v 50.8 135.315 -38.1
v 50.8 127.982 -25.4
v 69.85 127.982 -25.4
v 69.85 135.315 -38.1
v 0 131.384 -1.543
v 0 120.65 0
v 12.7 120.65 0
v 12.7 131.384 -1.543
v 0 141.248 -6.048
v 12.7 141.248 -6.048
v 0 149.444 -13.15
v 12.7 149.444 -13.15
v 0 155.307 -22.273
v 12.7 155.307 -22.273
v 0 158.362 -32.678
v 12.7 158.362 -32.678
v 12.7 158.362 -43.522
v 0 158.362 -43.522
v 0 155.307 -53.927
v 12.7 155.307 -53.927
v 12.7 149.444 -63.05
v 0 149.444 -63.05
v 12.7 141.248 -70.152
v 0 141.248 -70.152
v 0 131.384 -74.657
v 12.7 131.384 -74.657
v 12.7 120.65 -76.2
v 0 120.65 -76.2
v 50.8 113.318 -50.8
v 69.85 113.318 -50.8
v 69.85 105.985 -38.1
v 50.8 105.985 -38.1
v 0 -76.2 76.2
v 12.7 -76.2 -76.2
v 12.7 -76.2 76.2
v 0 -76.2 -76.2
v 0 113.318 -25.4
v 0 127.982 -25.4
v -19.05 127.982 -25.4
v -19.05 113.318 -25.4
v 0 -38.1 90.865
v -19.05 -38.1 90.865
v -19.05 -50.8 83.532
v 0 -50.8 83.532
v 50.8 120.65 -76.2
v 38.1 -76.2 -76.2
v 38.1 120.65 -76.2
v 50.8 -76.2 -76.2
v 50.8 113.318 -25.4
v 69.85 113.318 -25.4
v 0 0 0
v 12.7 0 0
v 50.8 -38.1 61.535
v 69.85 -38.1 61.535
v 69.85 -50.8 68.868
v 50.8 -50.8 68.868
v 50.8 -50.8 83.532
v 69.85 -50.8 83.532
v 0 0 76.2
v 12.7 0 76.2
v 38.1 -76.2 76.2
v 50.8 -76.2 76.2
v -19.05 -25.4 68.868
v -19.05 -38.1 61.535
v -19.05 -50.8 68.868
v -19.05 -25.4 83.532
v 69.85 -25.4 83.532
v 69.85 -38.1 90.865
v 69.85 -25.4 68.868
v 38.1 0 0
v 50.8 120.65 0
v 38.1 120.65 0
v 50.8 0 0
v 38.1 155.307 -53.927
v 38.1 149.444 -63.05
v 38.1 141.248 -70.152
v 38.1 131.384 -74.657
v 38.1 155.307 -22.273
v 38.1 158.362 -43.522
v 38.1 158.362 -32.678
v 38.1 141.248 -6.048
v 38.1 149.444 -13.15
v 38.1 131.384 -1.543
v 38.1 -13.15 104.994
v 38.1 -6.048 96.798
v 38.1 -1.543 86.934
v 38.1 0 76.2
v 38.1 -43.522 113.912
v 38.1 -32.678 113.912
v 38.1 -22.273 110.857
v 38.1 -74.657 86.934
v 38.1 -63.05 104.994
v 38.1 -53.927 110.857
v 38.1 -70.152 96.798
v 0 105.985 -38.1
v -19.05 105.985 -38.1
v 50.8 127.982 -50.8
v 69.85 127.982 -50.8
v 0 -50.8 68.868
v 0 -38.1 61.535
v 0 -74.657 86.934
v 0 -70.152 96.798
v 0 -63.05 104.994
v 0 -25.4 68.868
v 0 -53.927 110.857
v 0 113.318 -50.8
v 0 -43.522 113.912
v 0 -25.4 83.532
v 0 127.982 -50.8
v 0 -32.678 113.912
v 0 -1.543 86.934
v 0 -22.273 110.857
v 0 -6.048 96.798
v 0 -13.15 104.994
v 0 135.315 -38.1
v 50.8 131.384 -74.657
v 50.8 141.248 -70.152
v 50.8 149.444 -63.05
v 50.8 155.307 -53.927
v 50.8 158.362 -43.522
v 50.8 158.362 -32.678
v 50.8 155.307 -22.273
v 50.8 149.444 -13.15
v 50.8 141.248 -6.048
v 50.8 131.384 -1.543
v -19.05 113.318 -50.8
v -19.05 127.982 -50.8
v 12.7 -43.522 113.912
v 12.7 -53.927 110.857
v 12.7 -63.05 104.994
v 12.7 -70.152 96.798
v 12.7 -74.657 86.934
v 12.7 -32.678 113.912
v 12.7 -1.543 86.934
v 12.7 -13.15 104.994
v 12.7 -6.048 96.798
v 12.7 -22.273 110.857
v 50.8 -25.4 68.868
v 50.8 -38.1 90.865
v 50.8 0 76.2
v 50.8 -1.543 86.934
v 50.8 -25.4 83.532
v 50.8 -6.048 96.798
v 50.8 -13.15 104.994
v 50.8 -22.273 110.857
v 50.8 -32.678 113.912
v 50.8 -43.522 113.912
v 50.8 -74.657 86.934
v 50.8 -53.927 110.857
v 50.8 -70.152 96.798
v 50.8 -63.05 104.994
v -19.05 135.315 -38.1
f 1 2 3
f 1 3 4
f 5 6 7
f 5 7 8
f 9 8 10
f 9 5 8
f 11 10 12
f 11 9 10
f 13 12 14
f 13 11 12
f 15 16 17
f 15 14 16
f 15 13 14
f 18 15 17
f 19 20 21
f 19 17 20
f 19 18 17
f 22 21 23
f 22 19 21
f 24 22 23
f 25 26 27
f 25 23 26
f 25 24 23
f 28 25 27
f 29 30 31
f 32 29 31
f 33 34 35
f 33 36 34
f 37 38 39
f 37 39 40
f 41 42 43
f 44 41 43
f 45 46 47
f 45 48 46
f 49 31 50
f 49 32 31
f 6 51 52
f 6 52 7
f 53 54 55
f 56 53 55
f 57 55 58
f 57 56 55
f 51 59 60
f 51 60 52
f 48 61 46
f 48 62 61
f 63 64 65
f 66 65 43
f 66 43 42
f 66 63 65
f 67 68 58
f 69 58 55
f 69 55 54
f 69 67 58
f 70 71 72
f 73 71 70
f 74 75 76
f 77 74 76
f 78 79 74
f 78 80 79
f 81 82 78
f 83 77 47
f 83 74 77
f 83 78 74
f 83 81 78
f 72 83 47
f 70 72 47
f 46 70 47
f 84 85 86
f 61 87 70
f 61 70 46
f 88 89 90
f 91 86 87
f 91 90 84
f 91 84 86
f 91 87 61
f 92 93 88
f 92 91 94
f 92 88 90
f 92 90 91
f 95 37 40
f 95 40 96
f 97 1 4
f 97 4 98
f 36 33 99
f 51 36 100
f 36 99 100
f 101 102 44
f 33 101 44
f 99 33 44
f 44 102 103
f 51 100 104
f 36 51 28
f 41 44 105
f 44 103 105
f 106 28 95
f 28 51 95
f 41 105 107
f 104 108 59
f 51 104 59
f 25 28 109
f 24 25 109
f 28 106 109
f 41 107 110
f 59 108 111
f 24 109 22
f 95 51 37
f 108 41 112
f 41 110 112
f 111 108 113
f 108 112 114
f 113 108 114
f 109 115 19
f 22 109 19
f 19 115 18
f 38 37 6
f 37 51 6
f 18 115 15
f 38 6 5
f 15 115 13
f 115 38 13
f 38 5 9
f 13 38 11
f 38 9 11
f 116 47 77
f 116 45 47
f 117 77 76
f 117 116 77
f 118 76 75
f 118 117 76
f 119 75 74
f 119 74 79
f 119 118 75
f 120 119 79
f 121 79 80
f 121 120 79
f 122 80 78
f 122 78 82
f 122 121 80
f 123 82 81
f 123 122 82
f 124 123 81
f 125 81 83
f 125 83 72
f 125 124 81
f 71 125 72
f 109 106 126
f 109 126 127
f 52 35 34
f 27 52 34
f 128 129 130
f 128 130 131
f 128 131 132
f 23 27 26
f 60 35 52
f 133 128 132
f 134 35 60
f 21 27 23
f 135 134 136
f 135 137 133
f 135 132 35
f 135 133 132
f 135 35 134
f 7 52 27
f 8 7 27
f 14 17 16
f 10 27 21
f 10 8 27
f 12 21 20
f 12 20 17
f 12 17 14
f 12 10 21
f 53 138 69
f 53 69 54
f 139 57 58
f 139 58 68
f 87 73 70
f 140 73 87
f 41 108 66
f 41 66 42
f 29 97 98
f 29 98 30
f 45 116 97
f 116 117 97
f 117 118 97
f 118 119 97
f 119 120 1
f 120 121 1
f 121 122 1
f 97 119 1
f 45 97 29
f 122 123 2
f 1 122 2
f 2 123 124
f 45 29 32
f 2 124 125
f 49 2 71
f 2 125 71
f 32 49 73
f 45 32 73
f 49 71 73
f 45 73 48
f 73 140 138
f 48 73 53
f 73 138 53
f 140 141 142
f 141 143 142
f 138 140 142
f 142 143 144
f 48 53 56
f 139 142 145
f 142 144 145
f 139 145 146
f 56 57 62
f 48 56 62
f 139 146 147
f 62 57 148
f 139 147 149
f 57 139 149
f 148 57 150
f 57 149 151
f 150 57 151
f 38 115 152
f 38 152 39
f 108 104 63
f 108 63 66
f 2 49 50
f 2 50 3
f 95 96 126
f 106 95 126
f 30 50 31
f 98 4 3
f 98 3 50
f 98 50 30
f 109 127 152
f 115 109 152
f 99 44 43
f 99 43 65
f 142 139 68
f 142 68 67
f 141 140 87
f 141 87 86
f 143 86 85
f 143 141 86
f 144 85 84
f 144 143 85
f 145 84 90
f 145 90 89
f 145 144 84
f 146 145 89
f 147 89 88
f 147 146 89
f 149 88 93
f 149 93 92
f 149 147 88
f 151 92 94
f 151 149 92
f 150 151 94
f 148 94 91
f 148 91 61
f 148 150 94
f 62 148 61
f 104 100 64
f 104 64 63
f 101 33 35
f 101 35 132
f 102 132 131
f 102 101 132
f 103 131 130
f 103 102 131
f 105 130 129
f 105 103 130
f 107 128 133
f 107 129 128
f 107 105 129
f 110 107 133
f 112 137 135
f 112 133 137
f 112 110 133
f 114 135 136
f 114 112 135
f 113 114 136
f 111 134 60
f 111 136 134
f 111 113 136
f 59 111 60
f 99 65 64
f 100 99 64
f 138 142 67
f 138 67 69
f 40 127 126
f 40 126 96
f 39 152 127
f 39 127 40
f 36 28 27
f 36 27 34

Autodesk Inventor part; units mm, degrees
ref_plane "XZ Plane" through (0, 0, 0) normal (0, 1, 0) x (-1, 0, 0)
ref_plane "XY Plane" through (0, 0, 0) normal (0, 0, 1) x (1, 0, 0)
sketch "Sketch1" plane through (0, 0, 0) normal (1, 0, 0) x (0, 1, 0)
  arc A0 (120.65, -76.2) -> (120.65, 0) centre (120.65, -38.1) ccw
  arc A1 (0, 76.2) -> (-76.2, 76.2) centre (-38.1, 76.2) ccw
  line L0 (0, 76.2) -> (0, 0)
  line L1 (0, 0) -> (120.65, 0)
  line L2 (120.65, -76.2) -> (-76.2, -76.2)
  line L3 (-76.2, -76.2) -> (-76.2, 76.2)
  dimension "d1" = 76.2
  dimension "d2" = 76.2
  dimension "d7" = 0
  dimension "d8" = 120.65
  dimension "d9" = 0
  dimension "d10" = 76.2
extrude "Extrusion1" add sketch "Sketch1" along normal blind 12.7
ref_plane "Work Plane1" through (25.4, 0, 0) normal (1, 0, 0) x (0, 1, 0)
sketch "Sketch2" plane through (0, 0, 0) normal (-1, 0, 0) x (0, 0, 1)
  arc A0 (0, 120.65) -> (-76.2, 120.65) centre (-38.1, 120.65) ccw construction
  arc A1 (76.2, -76.2) -> (76.2, 0) centre (76.2, -38.1) ccw construction
  line L0 (-38.1, 105.9853) -> (-50.8, 113.3177)
  line L1 (-50.8, 113.3177) -> (-50.8, 127.9823)
  line L2 (-50.8, 127.9823) -> (-38.1, 135.3147)
  line L3 (-38.1, 135.3147) -> (-25.4, 127.9823)
  line L4 (-25.4, 127.9823) -> (-25.4, 113.3177)
  line L5 (-25.4, 113.3177) -> (-38.1, 105.9853)
  line L6 (61.5353, -38.1) -> (68.8677, -25.4)
  line L7 (68.8677, -25.4) -> (83.5323, -25.4)
  line L8 (83.5323, -25.4) -> (90.8647, -38.1)
  line L9 (90.8647, -38.1) -> (83.5323, -50.8)
  line L10 (83.5323, -50.8) -> (68.8677, -50.8)
  line L11 (68.8677, -50.8) -> (61.5353, -38.1)
  point P0 (0, 0)
  point P1 (76.2, -50.8)
  point P2 (76.2, -25.4)
  dimension "d12" = 25.4
  dimension "d13" = 25.4
extrude "Extrusion2" add sketch "Sketch2" along normal blind 19.05
mirror "Mirror2" about plane through (25.4, 0, 0) normal (1, 0, 0)
properties part number "mount_shaft_mount"
